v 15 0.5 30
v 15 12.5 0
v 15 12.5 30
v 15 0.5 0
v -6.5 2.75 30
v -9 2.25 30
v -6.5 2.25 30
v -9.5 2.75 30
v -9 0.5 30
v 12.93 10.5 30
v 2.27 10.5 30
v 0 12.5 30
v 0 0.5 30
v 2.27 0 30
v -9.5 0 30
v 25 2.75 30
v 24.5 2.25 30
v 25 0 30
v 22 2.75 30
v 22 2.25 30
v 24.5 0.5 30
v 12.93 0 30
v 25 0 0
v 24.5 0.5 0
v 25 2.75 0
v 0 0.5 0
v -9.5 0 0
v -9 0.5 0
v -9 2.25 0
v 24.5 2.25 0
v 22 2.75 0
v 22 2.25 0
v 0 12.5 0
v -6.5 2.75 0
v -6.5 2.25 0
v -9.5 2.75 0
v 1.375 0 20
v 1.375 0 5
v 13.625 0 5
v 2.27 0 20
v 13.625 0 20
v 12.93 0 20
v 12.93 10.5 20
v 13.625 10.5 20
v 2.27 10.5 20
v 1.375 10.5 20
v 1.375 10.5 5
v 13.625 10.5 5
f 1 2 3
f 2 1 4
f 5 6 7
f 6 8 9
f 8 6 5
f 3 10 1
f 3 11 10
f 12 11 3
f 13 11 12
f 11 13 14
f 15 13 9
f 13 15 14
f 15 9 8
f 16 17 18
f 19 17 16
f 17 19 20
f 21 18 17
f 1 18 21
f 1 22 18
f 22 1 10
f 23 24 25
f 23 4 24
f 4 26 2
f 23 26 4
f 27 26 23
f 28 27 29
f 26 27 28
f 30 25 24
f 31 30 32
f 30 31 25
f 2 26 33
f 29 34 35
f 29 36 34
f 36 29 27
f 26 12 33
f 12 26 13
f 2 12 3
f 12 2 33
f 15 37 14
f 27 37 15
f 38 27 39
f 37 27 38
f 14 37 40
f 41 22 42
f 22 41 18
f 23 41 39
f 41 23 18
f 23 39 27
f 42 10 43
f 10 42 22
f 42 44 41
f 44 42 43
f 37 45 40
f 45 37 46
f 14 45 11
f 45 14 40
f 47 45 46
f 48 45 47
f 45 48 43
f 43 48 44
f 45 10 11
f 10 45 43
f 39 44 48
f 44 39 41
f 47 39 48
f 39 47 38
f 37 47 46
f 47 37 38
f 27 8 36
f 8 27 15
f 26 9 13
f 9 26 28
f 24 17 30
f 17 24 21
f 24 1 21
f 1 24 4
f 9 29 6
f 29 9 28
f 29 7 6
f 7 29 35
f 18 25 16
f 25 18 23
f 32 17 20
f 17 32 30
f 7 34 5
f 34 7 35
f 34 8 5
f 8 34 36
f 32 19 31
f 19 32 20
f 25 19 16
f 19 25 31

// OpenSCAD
scale([10,10,10]){    
 difference(){
    cube([1.5,0.9+0.35,3]);
    translate([.135+0.092,0,2])cube([1.066,.7+0.35,2]);
    translate([.375-0.2375,0,0.5])cube([1.225,.7+0.35,1.5]);
}
}

translate([-9.5,0,0])cube([9.5,.5,30]);
translate([15,0,0])cube([9.5,.5,30]);

translate([-9.5,0,0])cube([0.5,2.25,30]);
translate([24.5,0,0])cube([0.5,2.25,30]);

translate([-9.5,2.25,0])cube([3,.5,30]);
translate([22,2.25,0])cube([3,.5,30]);
